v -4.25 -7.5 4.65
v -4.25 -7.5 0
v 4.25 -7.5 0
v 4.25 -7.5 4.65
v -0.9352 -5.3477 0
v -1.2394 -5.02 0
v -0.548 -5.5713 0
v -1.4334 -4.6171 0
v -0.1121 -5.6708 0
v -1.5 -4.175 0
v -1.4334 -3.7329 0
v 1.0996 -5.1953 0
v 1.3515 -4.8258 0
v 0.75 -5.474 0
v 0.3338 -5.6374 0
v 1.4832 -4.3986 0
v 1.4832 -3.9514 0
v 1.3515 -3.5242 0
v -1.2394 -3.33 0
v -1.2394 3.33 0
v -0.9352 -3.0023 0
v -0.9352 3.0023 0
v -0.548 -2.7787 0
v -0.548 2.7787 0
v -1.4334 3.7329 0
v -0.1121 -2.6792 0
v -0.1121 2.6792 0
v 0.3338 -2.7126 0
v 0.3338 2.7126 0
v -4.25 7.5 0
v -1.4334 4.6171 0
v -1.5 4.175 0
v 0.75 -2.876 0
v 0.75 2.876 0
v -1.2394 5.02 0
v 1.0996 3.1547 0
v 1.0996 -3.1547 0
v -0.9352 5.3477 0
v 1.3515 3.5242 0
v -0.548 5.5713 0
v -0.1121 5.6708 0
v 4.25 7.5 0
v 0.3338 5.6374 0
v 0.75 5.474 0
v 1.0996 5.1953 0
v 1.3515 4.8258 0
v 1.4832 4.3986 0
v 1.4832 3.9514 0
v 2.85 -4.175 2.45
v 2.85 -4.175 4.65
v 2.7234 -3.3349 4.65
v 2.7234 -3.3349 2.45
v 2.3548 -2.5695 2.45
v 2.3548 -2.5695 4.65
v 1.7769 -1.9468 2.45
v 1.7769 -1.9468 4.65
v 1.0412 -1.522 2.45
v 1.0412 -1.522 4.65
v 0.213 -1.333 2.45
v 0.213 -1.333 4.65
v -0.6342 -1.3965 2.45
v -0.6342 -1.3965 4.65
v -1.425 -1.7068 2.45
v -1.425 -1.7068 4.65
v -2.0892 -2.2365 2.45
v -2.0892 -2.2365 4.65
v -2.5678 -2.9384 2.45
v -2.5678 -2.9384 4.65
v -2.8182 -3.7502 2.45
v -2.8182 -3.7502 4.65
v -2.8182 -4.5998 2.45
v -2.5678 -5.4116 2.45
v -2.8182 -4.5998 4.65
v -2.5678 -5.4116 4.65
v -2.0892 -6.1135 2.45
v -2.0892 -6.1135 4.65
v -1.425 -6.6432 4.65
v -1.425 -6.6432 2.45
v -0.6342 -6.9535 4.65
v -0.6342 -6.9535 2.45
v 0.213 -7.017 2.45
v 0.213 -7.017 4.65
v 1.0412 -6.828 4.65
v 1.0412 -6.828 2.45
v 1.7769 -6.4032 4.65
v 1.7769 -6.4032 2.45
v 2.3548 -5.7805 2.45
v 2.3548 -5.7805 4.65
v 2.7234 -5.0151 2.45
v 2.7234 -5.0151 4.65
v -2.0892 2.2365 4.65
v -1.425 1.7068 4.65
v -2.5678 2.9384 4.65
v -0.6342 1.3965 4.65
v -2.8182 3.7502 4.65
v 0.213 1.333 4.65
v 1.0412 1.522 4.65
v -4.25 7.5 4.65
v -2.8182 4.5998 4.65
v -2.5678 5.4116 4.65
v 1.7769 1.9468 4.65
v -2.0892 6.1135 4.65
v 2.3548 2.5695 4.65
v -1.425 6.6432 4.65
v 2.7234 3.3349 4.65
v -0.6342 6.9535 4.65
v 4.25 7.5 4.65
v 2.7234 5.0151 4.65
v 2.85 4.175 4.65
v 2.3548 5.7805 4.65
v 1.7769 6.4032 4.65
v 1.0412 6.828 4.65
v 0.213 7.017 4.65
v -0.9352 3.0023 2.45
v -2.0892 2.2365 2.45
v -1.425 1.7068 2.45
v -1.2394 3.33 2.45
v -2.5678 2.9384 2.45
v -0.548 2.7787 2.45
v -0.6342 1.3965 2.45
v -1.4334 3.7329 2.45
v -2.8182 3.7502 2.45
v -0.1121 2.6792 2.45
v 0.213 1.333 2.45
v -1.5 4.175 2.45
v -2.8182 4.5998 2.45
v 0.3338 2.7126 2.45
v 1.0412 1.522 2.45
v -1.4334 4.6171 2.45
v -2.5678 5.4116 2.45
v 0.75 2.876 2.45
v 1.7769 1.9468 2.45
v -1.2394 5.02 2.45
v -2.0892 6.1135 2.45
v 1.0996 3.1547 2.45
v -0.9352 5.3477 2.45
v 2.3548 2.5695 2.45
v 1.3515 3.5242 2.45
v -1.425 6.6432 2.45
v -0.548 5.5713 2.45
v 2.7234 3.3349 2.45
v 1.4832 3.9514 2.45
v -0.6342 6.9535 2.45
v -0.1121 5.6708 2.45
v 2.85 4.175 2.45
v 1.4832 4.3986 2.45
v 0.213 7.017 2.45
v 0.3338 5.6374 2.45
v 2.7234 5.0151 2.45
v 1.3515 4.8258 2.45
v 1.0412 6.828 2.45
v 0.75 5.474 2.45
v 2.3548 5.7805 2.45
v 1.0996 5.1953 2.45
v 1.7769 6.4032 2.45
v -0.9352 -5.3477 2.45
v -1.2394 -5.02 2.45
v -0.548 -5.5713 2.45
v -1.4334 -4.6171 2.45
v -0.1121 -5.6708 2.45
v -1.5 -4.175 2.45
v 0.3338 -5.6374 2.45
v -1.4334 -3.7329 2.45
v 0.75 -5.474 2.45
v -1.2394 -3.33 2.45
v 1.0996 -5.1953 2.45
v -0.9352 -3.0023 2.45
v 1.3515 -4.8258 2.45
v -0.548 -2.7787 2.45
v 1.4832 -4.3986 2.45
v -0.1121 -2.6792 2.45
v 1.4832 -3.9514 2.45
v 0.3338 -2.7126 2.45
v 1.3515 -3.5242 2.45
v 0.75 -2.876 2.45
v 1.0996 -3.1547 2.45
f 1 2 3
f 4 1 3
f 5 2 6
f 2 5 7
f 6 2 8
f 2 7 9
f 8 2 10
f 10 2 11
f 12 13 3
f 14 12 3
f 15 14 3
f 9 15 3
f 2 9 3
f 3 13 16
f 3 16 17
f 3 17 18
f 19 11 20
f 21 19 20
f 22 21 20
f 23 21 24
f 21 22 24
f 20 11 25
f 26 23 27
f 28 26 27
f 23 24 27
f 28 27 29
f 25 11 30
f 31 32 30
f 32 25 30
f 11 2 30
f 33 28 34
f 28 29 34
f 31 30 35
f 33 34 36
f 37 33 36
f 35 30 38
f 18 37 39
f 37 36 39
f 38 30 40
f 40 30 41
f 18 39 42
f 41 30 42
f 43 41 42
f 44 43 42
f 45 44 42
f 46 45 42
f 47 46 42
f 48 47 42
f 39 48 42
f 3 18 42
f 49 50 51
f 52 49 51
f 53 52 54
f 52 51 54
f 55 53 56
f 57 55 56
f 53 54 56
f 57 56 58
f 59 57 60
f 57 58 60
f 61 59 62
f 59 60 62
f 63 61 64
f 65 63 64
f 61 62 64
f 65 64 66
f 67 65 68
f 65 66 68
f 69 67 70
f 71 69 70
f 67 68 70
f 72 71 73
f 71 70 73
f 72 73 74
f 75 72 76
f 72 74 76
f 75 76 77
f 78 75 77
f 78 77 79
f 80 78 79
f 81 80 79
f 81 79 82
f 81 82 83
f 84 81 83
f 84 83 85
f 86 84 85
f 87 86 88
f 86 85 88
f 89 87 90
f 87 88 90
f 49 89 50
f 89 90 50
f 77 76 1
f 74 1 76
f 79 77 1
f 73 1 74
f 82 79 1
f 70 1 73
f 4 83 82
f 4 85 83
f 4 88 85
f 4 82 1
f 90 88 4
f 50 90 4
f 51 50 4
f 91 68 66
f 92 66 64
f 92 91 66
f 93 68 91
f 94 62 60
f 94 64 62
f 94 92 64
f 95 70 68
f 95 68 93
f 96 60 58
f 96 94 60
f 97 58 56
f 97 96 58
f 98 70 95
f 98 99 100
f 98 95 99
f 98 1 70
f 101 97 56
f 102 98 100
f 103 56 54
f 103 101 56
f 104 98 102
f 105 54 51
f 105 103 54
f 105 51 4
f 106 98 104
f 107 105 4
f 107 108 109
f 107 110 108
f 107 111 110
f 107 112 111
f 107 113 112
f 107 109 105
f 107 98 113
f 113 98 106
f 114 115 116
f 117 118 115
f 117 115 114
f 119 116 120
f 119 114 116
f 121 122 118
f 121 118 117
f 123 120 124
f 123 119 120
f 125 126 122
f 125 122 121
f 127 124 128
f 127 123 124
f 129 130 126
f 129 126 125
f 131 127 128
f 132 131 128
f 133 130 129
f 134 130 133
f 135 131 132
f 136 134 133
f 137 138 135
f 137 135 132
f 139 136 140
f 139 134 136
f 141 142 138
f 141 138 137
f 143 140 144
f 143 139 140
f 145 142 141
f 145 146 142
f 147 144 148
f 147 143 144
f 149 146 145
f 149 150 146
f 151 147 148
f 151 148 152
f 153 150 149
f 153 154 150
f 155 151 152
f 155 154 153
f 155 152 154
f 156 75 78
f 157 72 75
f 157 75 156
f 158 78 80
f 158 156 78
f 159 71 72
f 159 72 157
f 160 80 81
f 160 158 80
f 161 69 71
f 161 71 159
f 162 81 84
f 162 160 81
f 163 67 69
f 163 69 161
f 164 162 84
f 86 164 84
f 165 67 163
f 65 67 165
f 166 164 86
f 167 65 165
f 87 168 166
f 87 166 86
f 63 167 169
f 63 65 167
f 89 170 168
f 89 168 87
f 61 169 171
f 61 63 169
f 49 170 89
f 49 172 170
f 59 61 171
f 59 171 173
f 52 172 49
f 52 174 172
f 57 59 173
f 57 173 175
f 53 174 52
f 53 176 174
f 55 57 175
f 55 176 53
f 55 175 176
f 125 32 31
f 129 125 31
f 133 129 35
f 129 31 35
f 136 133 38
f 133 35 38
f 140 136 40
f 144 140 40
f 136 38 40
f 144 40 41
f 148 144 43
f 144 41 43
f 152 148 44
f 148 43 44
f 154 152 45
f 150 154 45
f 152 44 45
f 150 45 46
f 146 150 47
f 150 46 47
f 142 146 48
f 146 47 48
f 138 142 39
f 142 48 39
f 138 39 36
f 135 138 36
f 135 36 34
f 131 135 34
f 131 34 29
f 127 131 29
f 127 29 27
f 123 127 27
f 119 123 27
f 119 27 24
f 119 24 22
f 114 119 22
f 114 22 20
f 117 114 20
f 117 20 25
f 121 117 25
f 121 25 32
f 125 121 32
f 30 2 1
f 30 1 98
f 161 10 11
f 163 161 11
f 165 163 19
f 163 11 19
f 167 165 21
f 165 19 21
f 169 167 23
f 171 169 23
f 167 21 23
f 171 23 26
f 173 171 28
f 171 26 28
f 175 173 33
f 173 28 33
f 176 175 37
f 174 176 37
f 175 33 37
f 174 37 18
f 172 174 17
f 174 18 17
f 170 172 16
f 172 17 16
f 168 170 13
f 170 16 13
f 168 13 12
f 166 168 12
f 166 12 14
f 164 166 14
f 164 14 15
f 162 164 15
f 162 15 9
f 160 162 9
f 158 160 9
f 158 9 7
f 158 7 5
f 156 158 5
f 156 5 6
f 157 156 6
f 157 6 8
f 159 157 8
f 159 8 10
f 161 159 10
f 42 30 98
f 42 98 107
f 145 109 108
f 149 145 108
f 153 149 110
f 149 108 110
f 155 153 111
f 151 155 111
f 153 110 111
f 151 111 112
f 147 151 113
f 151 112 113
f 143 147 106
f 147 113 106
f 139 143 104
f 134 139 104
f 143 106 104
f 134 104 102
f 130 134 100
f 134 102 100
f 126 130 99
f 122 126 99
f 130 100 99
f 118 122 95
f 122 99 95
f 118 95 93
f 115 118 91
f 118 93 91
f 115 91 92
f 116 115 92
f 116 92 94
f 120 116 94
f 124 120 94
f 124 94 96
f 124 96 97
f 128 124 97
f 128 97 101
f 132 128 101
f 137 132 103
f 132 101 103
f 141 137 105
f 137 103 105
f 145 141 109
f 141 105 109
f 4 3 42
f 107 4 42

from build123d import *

# Parameters (mm, degrees)
SKETCH1_W                 = 8.5
SKETCH1_H                 = 15
BOSS_EXTRUDE1_DEPTH       = 4.65
F_3_0MM_DOWEL_HOLE1_D     = 3
F_3_0MM_DOWEL_HOLE1_DEPTH = 5
F_3_0MM_DOWEL_HOLE1_TIP   = 0.901290929
SKETCH2_R                 = 2.85
CUT_EXTRUDE2_DEPTH        = 2.2


with BuildPart() as part:
    # Sketch1 → Boss-Extrude1 (new body)
    with BuildSketch(Plane.XY):
        Rectangle(SKETCH1_W, SKETCH1_H)
    extrude(amount=BOSS_EXTRUDE1_DEPTH)

    # Ø3.0mm Dowel Hole1
    with Locations(Plane.XY.offset(4.65)):
        with Locations((0, 4.175), (0, -4.175)):
            Hole(F_3_0MM_DOWEL_HOLE1_D / 2, depth=F_3_0MM_DOWEL_HOLE1_DEPTH)
            with Locations((0, 0, -(F_3_0MM_DOWEL_HOLE1_DEPTH + F_3_0MM_DOWEL_HOLE1_TIP / 2))):  # 118° drill point
                Cone(0, F_3_0MM_DOWEL_HOLE1_D / 2, F_3_0MM_DOWEL_HOLE1_TIP, mode=Mode.SUBTRACT)

    # Sketch2 → Cut-Extrude2 (cut)
    with BuildSketch(Plane.XY.offset(4.65)):
        with Locations((0, -4.175)):
            Circle(SKETCH2_R)
        with Locations((0, 4.175)):
            Circle(SKETCH2_R)
    extrude(amount=-CUT_EXTRUDE2_DEPTH, mode=Mode.SUBTRACT)


solid = part.part
